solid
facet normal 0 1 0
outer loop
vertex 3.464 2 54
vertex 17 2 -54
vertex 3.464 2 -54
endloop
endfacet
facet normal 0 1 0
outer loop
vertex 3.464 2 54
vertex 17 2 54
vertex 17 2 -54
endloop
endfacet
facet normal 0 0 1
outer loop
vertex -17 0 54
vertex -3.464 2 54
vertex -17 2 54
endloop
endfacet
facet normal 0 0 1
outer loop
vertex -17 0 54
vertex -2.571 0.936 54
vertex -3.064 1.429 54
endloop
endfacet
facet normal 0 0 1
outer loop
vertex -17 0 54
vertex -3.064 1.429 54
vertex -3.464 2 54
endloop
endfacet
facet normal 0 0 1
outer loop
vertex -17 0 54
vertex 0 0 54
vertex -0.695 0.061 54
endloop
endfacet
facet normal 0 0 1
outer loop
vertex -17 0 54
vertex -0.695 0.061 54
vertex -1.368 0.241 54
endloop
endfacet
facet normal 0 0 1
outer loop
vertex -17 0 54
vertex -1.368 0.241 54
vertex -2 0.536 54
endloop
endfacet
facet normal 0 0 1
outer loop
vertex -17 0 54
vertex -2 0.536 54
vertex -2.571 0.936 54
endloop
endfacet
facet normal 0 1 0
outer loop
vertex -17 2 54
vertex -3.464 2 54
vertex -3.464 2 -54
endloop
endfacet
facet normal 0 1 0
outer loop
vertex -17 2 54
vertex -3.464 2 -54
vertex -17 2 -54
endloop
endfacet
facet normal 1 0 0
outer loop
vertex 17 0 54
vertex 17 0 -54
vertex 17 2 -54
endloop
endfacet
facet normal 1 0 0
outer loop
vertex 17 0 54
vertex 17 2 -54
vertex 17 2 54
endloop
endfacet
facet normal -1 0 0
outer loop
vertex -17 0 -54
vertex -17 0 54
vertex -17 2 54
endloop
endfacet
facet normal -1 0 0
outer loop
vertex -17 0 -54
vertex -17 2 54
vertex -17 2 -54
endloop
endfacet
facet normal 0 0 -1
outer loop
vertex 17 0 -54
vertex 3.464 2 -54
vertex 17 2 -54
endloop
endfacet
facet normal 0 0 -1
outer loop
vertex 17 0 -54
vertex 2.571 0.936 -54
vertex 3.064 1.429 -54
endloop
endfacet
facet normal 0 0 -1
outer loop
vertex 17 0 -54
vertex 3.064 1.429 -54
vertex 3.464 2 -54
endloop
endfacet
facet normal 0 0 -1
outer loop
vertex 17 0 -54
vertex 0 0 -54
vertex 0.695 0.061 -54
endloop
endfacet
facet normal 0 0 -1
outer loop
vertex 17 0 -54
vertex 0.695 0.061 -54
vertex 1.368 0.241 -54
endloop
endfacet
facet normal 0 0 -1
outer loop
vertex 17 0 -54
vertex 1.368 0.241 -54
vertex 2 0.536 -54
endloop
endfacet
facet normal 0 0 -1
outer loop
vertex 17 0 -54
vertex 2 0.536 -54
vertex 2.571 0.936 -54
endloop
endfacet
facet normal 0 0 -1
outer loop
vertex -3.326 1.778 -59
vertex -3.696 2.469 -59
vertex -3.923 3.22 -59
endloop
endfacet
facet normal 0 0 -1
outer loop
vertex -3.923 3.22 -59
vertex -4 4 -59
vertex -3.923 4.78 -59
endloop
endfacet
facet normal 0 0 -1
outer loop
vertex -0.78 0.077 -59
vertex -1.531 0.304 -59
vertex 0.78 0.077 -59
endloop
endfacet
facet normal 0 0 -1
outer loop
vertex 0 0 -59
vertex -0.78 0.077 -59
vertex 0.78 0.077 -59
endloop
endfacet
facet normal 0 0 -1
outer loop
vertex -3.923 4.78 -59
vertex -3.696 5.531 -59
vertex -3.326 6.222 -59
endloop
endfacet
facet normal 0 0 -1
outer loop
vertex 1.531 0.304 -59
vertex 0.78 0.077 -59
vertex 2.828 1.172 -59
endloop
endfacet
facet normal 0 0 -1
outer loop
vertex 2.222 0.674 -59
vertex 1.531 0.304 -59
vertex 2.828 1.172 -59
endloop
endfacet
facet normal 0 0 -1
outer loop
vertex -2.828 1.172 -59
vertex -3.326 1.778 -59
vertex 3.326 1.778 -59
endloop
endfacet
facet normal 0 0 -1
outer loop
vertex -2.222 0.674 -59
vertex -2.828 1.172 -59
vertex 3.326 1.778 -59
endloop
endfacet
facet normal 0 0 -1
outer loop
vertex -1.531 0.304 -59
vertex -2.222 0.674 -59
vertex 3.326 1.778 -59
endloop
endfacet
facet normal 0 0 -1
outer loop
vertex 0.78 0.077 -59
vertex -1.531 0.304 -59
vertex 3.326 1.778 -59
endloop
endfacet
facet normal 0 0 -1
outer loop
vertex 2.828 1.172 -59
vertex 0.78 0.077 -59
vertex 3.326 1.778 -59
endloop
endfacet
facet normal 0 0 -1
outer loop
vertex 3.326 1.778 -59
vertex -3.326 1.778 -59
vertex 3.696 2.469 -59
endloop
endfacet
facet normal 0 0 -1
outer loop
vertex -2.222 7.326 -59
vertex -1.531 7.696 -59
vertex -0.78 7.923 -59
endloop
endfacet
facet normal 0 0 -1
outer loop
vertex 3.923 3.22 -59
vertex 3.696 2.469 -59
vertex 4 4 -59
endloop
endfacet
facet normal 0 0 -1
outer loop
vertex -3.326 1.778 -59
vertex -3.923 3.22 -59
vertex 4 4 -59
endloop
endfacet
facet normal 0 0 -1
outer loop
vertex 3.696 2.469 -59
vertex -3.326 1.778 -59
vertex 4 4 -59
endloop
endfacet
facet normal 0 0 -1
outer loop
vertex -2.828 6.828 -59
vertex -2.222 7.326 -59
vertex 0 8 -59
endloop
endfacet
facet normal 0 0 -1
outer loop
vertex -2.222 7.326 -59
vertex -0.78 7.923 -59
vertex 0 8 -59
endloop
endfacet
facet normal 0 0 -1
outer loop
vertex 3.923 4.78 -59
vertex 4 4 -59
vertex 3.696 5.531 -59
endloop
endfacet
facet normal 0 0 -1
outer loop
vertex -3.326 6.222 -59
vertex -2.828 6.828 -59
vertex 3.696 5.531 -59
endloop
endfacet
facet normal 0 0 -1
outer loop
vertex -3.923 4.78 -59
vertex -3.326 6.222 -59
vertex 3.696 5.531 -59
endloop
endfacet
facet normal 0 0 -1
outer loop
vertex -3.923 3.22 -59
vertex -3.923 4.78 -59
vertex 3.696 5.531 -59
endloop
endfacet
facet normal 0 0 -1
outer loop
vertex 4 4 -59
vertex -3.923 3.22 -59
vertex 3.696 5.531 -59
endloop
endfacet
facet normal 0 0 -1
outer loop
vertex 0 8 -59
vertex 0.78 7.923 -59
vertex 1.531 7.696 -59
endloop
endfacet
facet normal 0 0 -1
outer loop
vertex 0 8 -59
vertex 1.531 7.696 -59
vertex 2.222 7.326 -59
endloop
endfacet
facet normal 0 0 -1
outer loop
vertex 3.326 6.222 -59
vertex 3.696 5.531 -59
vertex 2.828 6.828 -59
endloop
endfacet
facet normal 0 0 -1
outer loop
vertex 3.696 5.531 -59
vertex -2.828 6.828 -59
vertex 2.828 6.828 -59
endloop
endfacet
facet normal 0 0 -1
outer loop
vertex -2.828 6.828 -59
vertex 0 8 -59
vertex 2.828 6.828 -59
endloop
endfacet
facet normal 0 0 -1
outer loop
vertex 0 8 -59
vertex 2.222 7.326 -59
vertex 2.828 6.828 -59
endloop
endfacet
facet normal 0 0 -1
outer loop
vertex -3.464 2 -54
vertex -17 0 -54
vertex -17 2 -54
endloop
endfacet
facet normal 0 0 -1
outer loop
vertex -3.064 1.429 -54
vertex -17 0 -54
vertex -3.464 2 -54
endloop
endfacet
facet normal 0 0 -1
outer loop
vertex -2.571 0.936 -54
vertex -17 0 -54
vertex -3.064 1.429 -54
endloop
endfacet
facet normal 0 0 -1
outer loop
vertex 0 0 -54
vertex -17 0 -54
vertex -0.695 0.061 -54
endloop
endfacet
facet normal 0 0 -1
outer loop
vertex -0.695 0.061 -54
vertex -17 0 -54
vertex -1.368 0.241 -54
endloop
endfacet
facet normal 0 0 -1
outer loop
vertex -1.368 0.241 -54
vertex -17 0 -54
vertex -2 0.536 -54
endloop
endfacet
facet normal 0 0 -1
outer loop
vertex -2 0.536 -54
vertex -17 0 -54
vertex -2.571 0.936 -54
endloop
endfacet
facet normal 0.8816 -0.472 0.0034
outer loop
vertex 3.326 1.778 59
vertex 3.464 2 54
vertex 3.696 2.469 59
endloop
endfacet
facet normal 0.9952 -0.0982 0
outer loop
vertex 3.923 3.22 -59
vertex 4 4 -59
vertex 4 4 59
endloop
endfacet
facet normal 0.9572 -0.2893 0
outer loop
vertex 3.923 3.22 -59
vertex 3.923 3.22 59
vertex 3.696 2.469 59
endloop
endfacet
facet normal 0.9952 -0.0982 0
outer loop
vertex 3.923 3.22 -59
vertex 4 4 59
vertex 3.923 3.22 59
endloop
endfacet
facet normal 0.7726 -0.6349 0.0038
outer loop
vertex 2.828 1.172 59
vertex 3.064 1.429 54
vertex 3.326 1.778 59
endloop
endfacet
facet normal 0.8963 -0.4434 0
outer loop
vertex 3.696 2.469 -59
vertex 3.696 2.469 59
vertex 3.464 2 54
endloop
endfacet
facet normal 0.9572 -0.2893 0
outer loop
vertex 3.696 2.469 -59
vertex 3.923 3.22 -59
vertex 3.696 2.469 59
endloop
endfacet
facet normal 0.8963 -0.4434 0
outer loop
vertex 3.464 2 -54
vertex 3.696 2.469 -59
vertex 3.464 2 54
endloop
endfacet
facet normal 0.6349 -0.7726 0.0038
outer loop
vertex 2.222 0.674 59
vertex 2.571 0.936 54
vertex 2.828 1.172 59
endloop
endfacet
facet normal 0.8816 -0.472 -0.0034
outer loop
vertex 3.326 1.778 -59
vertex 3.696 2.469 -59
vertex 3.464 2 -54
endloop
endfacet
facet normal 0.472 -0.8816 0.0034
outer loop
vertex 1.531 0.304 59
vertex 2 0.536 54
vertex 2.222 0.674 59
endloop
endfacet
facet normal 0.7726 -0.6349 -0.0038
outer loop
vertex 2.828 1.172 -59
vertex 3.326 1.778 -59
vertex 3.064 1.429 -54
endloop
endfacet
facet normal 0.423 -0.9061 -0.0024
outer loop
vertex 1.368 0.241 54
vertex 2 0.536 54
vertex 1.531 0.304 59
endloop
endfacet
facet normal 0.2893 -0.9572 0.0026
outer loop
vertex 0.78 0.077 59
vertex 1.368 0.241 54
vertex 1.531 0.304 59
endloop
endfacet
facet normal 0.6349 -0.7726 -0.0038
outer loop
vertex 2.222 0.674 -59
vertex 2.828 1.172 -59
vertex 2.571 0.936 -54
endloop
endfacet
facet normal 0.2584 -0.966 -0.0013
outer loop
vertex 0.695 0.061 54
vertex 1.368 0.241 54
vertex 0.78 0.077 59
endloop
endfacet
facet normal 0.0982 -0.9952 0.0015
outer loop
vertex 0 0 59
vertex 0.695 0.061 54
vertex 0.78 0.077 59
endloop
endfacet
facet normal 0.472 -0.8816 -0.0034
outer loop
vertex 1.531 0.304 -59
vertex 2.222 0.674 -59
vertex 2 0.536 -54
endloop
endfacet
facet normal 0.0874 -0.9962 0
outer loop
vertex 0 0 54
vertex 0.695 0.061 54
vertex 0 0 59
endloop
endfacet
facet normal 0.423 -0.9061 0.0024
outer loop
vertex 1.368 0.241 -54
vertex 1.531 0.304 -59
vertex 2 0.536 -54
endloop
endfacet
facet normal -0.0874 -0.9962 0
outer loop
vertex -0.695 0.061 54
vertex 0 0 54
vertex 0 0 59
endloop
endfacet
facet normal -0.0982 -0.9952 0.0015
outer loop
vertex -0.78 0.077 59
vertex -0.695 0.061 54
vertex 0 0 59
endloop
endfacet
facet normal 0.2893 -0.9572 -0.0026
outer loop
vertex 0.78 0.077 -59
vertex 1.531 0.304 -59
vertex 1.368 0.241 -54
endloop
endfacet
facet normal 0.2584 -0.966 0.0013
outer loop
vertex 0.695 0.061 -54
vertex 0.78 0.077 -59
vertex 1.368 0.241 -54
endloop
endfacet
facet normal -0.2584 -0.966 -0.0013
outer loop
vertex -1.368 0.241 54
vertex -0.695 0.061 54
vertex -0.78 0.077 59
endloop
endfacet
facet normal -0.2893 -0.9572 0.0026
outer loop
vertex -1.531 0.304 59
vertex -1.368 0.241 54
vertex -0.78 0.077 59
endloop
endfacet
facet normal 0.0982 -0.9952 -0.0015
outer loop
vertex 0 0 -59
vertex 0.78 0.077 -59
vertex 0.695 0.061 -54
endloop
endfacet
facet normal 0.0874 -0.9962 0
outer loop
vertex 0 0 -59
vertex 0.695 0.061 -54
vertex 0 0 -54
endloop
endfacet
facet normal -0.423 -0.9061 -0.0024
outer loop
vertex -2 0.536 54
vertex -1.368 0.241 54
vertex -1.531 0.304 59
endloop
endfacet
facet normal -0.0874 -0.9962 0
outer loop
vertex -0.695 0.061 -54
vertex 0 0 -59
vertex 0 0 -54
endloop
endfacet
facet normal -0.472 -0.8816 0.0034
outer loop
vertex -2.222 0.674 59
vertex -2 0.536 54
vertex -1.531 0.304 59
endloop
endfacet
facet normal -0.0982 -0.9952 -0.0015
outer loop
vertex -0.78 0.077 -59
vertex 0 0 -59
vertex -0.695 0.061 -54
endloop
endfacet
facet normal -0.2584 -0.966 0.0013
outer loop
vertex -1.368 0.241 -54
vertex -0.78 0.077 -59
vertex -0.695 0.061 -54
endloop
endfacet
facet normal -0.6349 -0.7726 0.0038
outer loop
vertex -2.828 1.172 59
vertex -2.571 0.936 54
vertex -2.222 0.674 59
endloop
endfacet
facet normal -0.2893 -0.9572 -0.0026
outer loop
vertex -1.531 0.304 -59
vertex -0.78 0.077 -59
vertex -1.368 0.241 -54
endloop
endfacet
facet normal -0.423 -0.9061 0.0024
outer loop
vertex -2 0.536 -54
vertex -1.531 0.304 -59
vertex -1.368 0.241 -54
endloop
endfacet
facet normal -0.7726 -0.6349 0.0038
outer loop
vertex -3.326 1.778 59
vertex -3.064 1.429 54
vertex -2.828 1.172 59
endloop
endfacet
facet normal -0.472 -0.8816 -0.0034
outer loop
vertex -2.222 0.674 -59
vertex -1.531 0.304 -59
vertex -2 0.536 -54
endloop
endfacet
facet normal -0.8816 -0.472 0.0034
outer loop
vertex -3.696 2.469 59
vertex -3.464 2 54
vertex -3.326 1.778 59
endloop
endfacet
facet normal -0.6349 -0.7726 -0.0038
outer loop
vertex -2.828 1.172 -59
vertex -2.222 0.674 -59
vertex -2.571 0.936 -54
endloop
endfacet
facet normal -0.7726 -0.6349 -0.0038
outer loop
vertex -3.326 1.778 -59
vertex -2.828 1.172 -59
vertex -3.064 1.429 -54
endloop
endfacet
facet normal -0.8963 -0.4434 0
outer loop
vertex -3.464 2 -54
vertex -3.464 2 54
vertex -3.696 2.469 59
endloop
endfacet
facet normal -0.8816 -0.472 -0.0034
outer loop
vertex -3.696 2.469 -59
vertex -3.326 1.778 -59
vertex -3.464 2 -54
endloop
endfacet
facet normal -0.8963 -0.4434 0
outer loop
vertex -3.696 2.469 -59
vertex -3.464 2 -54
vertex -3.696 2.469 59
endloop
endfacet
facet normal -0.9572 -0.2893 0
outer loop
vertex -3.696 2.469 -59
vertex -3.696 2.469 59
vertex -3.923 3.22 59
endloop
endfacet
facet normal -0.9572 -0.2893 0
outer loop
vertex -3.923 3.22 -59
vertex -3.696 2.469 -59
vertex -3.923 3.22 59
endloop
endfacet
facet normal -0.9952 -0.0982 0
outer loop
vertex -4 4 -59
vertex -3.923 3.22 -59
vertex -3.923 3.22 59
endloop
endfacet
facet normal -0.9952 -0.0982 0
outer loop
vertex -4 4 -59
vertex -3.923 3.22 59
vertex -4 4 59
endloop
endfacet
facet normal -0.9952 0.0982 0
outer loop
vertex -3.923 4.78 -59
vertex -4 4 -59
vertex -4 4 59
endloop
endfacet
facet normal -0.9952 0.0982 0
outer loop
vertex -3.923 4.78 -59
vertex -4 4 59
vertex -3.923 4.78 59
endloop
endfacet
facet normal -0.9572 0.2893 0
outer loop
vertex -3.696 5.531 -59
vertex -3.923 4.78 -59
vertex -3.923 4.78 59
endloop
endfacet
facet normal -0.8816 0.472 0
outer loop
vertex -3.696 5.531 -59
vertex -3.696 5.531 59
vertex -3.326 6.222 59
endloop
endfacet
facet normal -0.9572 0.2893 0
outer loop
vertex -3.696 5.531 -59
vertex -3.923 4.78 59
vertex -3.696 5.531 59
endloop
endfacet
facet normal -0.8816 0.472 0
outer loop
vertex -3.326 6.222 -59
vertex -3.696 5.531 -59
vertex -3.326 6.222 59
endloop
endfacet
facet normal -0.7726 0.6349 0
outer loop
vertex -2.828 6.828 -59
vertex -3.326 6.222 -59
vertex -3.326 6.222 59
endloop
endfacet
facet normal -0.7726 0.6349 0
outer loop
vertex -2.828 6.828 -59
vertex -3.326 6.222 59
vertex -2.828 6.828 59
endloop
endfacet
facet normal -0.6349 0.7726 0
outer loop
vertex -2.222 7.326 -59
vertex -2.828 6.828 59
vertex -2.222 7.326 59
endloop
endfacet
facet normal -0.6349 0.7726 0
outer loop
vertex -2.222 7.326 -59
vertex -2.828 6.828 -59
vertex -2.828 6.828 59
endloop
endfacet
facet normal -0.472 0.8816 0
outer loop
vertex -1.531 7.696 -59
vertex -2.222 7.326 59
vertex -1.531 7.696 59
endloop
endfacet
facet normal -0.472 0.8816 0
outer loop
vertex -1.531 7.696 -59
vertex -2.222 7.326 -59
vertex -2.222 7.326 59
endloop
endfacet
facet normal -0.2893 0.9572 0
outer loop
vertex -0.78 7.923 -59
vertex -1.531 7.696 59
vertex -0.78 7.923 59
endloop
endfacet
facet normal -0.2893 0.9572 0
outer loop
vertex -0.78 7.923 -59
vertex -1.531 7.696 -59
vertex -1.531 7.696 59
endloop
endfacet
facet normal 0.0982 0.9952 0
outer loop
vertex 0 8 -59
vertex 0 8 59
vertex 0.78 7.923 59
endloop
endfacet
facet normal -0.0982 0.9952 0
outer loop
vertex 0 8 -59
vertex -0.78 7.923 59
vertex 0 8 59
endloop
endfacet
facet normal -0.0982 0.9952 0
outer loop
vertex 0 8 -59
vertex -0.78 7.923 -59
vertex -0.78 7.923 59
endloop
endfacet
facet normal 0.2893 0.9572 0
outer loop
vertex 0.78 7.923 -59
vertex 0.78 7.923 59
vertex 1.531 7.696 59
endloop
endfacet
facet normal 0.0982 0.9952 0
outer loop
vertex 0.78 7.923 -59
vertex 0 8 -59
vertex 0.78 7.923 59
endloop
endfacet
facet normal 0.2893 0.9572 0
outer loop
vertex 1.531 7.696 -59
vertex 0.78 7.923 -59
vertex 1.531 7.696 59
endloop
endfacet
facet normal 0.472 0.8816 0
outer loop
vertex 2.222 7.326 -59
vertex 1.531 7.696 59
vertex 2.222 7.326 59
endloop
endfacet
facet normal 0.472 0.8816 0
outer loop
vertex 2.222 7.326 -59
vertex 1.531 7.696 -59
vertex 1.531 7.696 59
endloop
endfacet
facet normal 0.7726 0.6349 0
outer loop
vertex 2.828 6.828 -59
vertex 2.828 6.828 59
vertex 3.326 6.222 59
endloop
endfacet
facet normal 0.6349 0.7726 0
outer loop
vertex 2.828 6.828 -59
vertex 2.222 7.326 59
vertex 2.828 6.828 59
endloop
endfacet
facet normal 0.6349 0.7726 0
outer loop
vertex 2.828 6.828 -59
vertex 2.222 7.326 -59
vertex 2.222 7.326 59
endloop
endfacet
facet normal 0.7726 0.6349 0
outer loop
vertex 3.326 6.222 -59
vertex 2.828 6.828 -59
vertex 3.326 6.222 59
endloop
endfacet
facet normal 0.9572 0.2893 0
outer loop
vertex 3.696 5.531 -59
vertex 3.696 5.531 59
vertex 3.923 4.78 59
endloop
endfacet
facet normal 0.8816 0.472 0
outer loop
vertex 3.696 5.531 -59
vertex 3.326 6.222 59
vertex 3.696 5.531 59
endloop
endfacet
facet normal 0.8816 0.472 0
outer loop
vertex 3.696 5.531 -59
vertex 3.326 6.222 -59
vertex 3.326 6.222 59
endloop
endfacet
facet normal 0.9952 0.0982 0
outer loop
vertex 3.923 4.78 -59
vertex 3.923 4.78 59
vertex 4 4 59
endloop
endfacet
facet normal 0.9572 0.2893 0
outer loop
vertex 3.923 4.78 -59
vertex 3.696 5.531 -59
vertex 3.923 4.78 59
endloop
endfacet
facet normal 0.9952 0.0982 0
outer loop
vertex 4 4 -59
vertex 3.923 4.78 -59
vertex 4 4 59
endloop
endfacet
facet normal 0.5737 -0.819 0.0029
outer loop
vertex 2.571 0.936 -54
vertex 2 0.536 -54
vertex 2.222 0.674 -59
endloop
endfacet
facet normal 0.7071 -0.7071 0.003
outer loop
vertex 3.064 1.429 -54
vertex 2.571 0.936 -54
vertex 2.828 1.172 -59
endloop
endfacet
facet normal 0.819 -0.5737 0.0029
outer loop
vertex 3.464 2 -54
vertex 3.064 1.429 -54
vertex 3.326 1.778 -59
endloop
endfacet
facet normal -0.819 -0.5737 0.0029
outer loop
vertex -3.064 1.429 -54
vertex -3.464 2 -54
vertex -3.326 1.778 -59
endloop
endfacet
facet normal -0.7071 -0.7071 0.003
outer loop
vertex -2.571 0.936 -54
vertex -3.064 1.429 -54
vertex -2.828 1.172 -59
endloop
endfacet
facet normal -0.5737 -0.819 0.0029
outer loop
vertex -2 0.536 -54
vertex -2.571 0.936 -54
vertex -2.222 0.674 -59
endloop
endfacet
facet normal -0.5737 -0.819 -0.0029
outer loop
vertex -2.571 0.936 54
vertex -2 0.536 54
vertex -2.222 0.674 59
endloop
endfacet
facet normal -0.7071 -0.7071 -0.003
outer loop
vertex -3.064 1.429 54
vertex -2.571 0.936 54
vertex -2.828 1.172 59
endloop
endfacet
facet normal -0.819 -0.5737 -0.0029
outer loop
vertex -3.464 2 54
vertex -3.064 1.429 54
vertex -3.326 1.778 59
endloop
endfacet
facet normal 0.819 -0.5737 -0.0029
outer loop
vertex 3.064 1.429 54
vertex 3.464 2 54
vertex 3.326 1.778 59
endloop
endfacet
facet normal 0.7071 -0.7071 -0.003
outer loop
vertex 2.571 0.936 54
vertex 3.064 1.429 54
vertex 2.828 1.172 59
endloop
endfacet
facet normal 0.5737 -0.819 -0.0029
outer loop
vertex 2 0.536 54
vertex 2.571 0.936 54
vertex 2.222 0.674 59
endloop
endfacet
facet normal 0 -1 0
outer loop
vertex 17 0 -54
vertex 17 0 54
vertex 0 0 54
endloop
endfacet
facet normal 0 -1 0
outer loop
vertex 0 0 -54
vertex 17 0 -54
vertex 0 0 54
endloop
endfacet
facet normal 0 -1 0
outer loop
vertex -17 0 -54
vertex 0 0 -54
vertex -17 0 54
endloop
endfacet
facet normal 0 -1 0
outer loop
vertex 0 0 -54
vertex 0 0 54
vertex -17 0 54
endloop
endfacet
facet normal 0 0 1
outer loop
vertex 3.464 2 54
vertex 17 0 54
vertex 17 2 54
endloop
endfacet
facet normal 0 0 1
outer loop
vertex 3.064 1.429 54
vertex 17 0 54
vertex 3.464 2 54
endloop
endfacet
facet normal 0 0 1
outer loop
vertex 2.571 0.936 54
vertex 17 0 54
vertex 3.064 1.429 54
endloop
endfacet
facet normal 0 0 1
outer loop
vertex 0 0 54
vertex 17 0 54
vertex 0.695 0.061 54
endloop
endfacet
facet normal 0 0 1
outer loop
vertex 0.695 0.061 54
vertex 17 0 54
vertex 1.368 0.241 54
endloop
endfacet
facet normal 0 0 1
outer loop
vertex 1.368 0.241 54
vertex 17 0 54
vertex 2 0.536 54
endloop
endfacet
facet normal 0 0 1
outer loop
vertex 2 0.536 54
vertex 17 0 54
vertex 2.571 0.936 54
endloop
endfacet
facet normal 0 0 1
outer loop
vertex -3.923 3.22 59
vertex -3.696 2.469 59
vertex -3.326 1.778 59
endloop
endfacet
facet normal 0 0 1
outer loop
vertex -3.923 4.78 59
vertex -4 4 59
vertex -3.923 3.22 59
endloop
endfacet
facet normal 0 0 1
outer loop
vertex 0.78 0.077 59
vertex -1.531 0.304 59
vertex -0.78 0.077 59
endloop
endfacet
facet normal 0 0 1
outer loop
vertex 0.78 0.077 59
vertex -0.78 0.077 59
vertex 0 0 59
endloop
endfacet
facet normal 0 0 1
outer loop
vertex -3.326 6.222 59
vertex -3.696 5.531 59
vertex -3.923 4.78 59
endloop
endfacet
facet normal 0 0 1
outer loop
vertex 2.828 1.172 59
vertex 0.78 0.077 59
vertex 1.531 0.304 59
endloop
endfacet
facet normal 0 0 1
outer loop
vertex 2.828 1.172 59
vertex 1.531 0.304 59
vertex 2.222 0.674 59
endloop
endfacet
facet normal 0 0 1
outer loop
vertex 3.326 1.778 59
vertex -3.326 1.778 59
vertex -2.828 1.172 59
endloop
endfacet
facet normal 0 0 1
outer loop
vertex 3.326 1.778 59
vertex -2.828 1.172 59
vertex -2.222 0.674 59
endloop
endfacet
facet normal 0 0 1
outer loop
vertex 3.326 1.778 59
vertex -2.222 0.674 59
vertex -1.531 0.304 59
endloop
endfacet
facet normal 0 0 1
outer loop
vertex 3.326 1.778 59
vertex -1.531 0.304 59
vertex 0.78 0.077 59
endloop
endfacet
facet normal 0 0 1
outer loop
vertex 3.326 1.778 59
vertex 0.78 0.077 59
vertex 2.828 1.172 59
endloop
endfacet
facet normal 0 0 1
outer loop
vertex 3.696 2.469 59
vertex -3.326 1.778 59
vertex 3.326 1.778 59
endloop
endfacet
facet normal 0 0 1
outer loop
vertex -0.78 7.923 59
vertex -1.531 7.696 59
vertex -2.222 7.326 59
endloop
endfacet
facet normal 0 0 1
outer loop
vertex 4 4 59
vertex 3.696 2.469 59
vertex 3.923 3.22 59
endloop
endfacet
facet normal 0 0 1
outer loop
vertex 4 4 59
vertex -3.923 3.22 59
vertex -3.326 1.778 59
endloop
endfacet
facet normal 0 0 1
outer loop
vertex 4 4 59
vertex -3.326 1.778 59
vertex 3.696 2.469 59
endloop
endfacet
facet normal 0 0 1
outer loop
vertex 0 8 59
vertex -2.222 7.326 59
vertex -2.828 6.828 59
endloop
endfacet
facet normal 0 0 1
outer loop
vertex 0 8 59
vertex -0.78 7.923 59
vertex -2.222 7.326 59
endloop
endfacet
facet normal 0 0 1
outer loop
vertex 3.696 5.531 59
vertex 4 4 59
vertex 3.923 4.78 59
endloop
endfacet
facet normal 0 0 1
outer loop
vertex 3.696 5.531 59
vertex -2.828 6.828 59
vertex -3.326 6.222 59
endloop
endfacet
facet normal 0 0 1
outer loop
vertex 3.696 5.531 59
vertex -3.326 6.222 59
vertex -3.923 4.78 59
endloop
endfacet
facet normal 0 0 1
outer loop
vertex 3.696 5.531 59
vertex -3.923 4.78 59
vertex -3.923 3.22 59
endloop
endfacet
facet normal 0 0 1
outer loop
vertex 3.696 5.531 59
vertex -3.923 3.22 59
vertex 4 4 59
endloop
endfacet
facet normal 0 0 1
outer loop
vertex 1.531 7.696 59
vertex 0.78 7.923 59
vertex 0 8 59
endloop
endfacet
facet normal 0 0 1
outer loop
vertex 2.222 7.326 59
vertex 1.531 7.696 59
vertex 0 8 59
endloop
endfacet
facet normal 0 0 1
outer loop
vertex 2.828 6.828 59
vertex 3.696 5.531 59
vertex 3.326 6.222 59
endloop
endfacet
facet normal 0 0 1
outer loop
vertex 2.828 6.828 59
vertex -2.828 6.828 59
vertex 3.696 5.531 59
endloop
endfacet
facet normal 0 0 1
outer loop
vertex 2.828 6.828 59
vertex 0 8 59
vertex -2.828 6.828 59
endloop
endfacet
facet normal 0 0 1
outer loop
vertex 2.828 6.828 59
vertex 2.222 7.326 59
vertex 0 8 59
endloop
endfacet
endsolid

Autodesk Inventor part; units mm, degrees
ref_plane "YZ Plane" through (0, 0, 0) normal (1, 0, 0) x (0, 1, 0)
ref_plane "XZ Plane" through (0, 0, 0) normal (0, 1, 0) x (-1, 0, 0)
ref_plane "XY Plane" through (0, 0, 0) normal (0, 0, 1) x (1, 0, 0)
sketch "Sketch1" plane through (0, 0, 0) normal (0, 1, 0) x (-1, 0, 0)
  line L0 (-17, 54) -> (17, 54)
  line L1 (17, 54) -> (17, -54)
  line L2 (17, -54) -> (-17, -54)
  line L3 (-17, -54) -> (-17, 54)
  line L4 (-17, 54) -> (17, -54) construction
  line L5 (17, 54) -> (-17, -54) construction
  point P0 (0, 0)
  dimension "d0" = 34
  dimension "d1" = 108
extrude "Extrusion1" add sketch "Sketch1" along normal blind 2
sketch "Sketch2" plane through (0, 0, 0) normal (0, 0, 1) x (1, 0, 0)
  circle A0 centre (0, 4) radius 4
  point P0 (0, 0)
  dimension "d4" = 8
extrude "Extrusion2" add sketch "Sketch2" along normal mid plane 118
properties part number "Air_Cotrol"
